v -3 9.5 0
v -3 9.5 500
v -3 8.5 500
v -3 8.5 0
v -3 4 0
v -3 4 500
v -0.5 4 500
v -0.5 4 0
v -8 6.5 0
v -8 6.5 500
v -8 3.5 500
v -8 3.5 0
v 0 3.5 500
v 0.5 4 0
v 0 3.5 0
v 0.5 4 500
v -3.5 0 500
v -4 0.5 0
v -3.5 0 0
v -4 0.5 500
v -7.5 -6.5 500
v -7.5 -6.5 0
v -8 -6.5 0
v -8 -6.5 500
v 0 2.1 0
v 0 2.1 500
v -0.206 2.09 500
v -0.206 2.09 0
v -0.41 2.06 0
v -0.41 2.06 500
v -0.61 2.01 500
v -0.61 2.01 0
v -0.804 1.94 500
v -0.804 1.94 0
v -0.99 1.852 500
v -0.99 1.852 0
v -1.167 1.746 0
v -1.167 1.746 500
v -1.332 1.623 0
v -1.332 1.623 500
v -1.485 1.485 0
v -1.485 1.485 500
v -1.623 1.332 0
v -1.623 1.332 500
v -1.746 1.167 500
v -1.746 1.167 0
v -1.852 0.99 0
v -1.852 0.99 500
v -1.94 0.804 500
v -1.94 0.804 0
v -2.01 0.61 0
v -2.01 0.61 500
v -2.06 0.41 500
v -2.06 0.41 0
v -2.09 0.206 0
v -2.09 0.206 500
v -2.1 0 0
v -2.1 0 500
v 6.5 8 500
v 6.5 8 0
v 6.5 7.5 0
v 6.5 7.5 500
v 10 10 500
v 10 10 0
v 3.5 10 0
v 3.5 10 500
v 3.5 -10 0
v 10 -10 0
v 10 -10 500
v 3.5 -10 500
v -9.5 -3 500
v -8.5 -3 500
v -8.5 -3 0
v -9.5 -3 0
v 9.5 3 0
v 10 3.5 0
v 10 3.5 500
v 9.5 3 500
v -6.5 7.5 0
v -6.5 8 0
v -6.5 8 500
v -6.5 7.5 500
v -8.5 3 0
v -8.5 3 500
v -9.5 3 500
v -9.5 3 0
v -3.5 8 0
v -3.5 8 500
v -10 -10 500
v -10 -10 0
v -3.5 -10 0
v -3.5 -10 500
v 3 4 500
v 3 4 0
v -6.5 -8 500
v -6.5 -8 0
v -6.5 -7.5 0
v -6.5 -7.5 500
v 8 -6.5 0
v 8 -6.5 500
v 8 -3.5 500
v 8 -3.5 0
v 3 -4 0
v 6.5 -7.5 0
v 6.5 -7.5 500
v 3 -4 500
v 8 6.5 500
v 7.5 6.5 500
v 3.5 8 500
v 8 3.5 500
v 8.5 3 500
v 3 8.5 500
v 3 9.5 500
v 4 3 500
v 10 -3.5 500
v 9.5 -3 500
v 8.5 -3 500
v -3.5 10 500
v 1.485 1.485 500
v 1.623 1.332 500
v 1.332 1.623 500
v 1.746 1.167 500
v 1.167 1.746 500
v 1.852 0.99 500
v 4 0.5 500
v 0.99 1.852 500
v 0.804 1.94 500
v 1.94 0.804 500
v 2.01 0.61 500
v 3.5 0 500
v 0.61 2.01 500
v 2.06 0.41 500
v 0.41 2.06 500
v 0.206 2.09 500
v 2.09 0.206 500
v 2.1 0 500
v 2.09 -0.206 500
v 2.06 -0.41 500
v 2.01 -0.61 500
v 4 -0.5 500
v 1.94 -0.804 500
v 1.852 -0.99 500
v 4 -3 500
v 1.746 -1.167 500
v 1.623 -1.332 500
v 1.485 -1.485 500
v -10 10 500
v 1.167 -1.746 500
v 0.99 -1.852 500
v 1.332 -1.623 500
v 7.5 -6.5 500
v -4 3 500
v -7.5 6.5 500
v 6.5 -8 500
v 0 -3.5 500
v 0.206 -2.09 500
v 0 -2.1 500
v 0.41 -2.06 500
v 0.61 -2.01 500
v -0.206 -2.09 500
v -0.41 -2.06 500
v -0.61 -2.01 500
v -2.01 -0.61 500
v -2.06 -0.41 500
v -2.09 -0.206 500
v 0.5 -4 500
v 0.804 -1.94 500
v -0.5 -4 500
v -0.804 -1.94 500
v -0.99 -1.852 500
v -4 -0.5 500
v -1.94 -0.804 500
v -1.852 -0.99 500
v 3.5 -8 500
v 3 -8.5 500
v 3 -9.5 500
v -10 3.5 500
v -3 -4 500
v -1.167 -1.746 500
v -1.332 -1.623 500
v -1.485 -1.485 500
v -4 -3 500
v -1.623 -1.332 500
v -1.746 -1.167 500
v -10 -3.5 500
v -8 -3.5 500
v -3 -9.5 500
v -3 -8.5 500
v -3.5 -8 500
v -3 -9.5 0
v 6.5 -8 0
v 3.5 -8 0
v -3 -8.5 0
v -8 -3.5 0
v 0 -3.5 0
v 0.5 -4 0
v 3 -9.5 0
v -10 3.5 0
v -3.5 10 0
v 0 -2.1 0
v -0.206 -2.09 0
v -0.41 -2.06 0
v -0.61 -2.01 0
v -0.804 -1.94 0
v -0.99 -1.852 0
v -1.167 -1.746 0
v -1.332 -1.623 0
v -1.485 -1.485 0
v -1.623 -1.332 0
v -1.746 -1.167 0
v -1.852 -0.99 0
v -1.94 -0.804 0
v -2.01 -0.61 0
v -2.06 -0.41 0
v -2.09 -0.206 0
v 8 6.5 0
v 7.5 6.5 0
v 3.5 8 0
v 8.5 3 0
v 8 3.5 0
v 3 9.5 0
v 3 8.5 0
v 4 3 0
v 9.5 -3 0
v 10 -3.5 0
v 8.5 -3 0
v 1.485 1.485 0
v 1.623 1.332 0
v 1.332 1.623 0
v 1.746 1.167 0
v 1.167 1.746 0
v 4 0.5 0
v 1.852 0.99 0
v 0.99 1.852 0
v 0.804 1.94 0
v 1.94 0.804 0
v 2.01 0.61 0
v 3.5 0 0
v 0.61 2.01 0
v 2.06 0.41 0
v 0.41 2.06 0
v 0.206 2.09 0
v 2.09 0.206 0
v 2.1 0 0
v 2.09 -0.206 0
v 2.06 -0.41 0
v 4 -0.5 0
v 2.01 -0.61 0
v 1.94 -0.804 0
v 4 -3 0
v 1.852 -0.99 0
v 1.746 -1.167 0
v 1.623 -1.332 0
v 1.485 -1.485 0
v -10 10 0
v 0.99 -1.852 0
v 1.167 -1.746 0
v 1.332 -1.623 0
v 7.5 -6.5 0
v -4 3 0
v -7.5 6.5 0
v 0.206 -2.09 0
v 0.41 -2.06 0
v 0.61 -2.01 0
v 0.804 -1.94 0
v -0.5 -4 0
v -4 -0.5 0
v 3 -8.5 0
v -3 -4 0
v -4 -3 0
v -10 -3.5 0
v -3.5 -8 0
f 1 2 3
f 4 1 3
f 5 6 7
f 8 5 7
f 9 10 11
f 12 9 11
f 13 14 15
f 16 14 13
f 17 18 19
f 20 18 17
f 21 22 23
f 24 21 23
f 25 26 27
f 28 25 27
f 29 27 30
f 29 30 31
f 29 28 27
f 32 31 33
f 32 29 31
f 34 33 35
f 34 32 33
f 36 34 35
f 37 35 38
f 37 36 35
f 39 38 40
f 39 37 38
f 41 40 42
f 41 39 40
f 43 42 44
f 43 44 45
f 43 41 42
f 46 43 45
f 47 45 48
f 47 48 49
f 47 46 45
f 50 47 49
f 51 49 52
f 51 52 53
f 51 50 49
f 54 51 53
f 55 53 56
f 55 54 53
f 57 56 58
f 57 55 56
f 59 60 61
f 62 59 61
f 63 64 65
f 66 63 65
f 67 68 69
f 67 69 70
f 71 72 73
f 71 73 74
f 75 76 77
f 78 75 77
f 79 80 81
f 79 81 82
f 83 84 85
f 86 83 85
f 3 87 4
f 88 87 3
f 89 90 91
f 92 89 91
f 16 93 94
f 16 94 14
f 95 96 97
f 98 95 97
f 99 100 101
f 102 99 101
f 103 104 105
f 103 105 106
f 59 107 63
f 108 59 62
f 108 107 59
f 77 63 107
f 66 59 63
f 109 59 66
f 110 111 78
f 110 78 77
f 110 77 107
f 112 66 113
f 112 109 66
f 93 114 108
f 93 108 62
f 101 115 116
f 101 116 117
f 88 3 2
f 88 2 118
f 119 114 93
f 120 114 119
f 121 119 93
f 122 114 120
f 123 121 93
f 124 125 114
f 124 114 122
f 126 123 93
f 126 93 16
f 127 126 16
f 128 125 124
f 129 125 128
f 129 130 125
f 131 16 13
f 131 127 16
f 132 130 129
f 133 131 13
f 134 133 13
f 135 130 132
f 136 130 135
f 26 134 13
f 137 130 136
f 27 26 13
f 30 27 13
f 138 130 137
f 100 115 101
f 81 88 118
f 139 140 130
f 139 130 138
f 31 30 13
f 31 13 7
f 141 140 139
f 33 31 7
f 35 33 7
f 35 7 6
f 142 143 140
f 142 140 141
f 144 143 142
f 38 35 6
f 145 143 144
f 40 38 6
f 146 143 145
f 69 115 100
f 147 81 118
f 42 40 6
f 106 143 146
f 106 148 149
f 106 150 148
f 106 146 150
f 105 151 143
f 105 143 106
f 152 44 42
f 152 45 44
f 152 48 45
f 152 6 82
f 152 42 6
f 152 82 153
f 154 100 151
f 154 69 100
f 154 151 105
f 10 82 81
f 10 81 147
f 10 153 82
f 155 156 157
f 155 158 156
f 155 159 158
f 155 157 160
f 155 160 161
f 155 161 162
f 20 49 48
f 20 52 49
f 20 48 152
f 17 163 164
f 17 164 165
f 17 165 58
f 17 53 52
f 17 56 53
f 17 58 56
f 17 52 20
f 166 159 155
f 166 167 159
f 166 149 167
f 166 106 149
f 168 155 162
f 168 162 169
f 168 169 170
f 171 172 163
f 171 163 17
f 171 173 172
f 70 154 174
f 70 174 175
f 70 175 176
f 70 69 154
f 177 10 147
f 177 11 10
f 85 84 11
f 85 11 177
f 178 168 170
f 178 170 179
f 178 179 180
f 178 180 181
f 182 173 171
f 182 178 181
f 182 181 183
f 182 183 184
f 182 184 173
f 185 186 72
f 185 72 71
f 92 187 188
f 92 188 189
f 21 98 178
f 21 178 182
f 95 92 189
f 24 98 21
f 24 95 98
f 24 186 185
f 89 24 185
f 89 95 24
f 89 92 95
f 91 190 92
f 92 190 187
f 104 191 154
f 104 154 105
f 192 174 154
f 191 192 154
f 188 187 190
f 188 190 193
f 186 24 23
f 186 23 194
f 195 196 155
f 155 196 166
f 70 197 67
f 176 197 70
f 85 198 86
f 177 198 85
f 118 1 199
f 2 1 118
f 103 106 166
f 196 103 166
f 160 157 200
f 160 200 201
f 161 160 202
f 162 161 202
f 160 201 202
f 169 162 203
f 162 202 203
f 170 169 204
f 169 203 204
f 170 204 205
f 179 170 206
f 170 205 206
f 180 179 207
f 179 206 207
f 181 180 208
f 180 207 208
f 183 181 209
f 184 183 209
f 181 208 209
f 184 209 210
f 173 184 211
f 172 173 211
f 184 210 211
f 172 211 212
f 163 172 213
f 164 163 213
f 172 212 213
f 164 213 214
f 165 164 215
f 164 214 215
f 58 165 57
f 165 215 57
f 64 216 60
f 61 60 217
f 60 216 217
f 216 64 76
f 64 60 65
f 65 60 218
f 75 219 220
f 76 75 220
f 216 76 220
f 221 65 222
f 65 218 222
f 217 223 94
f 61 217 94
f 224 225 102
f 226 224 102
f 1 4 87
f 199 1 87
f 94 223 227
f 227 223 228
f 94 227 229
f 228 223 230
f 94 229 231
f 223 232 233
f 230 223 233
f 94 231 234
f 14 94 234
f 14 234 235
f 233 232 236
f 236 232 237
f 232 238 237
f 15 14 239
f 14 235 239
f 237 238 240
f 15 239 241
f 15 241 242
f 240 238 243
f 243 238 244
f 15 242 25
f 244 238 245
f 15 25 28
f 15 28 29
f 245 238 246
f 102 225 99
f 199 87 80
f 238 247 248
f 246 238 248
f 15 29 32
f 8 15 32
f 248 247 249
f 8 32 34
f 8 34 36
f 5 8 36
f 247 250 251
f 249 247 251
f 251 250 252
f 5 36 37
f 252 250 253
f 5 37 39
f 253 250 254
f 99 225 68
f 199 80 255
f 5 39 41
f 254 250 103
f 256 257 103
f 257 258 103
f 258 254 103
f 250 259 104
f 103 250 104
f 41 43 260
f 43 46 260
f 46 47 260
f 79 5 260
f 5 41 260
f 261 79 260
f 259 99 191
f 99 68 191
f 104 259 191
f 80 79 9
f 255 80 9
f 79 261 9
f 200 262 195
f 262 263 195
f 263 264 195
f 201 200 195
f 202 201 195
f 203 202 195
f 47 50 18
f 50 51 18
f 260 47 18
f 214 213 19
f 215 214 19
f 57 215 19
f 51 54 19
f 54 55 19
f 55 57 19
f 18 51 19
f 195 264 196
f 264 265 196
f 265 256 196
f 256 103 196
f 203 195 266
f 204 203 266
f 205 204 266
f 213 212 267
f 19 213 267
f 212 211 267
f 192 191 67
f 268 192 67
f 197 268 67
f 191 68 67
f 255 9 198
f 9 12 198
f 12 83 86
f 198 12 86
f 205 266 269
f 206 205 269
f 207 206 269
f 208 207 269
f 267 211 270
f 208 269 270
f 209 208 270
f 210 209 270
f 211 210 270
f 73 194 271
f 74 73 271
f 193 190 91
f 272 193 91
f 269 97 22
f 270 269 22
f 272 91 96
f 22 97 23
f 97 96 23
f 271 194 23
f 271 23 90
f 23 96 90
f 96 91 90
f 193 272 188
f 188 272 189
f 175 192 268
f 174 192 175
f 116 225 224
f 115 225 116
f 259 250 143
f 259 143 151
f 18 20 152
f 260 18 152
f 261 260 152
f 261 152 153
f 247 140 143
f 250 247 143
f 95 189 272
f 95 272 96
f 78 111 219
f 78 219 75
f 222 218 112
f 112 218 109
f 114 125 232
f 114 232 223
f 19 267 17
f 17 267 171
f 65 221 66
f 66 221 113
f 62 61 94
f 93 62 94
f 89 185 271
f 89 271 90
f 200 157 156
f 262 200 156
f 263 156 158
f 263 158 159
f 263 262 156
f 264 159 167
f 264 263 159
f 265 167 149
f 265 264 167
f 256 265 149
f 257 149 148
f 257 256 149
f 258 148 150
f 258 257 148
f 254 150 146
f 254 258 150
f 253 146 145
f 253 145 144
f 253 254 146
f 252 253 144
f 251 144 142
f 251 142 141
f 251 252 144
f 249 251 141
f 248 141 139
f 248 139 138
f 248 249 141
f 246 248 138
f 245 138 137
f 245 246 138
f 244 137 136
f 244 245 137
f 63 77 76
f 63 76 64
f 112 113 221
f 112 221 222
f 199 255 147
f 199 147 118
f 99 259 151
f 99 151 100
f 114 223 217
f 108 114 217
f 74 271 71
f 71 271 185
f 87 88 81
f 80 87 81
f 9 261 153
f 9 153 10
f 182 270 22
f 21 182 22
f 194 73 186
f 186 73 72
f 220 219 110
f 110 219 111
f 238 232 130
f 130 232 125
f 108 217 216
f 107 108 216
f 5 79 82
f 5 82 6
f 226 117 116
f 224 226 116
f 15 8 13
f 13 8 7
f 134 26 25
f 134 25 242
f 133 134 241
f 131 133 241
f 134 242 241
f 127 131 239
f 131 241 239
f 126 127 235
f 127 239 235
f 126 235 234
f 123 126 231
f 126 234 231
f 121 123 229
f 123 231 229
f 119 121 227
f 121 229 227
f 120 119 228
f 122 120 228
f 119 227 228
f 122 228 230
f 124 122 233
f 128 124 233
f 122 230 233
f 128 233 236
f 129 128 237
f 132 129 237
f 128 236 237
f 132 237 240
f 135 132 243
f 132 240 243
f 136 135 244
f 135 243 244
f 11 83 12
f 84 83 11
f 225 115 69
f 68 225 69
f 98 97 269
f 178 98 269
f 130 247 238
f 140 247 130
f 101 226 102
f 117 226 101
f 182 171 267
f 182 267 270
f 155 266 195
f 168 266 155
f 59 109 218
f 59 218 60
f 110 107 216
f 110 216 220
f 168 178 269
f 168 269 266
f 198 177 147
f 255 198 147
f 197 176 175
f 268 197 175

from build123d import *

# Parameters (mm, degrees)
F2_DEPTH = 500
F3_SIZE  = 0.5


with BuildPart() as f2:
    # F1 (on Top) → F2 (new body)
    with BuildSketch(Plane.XY):
        with BuildLine():
            Line((0, 4), (0, 2.1))
            ThreePointArc((0, 2.1), (1.4849242405, 1.4849242405), (2.1, 0))
            Line((2.1, 0), (4, 0))
            Line((4, 0), (4, 3))
            Line((4, 3), (7.5, 6.5))
            Line((7.5, 6.5), (8, 6.5))
            Line((8, 6.5), (8, 3))
            Line((8, 3), (10, 3))
            Line((10, 3), (10, 10))
            Line((10, 10), (3, 10))
            Line((3, 10), (3, 8))
            Line((3, 8), (6.5, 8))
            Line((6.5, 8), (6.5, 7.5))
            Line((6.5, 7.5), (3, 4))
            Line((3, 4), (0, 4))
        make_face()
    extrude(amount=F2_DEPTH)

    # F3
    f3_edges = [f2.edges().sort_by_distance(p)[0] for p in [
        (0, 4, 250),
        (4, 0, 250),
        (3, 8, 250),
        (8, 3, 250),
        (10, 3, 250),
        (3, 10, 250),
    ]]
    chamfer(f3_edges, length=F3_SIZE)

    # F4: F2 across face


with BuildPart() as f2_1:
    add(f2.part)
    add(f2.part.mirror(Plane(origin=(0, 2.8, 250), x_dir=(0, -1, 0), z_dir=(-1, 0, 0))))

    # F5: F2 across face


with BuildPart() as f2_2:
    add(f2_1.part)
    add(f2_1.part.mirror(Plane(origin=(-2.8, 0, 250), x_dir=(1, 0, 0), z_dir=(0, -1, 0))))


solid = f2_2.part
